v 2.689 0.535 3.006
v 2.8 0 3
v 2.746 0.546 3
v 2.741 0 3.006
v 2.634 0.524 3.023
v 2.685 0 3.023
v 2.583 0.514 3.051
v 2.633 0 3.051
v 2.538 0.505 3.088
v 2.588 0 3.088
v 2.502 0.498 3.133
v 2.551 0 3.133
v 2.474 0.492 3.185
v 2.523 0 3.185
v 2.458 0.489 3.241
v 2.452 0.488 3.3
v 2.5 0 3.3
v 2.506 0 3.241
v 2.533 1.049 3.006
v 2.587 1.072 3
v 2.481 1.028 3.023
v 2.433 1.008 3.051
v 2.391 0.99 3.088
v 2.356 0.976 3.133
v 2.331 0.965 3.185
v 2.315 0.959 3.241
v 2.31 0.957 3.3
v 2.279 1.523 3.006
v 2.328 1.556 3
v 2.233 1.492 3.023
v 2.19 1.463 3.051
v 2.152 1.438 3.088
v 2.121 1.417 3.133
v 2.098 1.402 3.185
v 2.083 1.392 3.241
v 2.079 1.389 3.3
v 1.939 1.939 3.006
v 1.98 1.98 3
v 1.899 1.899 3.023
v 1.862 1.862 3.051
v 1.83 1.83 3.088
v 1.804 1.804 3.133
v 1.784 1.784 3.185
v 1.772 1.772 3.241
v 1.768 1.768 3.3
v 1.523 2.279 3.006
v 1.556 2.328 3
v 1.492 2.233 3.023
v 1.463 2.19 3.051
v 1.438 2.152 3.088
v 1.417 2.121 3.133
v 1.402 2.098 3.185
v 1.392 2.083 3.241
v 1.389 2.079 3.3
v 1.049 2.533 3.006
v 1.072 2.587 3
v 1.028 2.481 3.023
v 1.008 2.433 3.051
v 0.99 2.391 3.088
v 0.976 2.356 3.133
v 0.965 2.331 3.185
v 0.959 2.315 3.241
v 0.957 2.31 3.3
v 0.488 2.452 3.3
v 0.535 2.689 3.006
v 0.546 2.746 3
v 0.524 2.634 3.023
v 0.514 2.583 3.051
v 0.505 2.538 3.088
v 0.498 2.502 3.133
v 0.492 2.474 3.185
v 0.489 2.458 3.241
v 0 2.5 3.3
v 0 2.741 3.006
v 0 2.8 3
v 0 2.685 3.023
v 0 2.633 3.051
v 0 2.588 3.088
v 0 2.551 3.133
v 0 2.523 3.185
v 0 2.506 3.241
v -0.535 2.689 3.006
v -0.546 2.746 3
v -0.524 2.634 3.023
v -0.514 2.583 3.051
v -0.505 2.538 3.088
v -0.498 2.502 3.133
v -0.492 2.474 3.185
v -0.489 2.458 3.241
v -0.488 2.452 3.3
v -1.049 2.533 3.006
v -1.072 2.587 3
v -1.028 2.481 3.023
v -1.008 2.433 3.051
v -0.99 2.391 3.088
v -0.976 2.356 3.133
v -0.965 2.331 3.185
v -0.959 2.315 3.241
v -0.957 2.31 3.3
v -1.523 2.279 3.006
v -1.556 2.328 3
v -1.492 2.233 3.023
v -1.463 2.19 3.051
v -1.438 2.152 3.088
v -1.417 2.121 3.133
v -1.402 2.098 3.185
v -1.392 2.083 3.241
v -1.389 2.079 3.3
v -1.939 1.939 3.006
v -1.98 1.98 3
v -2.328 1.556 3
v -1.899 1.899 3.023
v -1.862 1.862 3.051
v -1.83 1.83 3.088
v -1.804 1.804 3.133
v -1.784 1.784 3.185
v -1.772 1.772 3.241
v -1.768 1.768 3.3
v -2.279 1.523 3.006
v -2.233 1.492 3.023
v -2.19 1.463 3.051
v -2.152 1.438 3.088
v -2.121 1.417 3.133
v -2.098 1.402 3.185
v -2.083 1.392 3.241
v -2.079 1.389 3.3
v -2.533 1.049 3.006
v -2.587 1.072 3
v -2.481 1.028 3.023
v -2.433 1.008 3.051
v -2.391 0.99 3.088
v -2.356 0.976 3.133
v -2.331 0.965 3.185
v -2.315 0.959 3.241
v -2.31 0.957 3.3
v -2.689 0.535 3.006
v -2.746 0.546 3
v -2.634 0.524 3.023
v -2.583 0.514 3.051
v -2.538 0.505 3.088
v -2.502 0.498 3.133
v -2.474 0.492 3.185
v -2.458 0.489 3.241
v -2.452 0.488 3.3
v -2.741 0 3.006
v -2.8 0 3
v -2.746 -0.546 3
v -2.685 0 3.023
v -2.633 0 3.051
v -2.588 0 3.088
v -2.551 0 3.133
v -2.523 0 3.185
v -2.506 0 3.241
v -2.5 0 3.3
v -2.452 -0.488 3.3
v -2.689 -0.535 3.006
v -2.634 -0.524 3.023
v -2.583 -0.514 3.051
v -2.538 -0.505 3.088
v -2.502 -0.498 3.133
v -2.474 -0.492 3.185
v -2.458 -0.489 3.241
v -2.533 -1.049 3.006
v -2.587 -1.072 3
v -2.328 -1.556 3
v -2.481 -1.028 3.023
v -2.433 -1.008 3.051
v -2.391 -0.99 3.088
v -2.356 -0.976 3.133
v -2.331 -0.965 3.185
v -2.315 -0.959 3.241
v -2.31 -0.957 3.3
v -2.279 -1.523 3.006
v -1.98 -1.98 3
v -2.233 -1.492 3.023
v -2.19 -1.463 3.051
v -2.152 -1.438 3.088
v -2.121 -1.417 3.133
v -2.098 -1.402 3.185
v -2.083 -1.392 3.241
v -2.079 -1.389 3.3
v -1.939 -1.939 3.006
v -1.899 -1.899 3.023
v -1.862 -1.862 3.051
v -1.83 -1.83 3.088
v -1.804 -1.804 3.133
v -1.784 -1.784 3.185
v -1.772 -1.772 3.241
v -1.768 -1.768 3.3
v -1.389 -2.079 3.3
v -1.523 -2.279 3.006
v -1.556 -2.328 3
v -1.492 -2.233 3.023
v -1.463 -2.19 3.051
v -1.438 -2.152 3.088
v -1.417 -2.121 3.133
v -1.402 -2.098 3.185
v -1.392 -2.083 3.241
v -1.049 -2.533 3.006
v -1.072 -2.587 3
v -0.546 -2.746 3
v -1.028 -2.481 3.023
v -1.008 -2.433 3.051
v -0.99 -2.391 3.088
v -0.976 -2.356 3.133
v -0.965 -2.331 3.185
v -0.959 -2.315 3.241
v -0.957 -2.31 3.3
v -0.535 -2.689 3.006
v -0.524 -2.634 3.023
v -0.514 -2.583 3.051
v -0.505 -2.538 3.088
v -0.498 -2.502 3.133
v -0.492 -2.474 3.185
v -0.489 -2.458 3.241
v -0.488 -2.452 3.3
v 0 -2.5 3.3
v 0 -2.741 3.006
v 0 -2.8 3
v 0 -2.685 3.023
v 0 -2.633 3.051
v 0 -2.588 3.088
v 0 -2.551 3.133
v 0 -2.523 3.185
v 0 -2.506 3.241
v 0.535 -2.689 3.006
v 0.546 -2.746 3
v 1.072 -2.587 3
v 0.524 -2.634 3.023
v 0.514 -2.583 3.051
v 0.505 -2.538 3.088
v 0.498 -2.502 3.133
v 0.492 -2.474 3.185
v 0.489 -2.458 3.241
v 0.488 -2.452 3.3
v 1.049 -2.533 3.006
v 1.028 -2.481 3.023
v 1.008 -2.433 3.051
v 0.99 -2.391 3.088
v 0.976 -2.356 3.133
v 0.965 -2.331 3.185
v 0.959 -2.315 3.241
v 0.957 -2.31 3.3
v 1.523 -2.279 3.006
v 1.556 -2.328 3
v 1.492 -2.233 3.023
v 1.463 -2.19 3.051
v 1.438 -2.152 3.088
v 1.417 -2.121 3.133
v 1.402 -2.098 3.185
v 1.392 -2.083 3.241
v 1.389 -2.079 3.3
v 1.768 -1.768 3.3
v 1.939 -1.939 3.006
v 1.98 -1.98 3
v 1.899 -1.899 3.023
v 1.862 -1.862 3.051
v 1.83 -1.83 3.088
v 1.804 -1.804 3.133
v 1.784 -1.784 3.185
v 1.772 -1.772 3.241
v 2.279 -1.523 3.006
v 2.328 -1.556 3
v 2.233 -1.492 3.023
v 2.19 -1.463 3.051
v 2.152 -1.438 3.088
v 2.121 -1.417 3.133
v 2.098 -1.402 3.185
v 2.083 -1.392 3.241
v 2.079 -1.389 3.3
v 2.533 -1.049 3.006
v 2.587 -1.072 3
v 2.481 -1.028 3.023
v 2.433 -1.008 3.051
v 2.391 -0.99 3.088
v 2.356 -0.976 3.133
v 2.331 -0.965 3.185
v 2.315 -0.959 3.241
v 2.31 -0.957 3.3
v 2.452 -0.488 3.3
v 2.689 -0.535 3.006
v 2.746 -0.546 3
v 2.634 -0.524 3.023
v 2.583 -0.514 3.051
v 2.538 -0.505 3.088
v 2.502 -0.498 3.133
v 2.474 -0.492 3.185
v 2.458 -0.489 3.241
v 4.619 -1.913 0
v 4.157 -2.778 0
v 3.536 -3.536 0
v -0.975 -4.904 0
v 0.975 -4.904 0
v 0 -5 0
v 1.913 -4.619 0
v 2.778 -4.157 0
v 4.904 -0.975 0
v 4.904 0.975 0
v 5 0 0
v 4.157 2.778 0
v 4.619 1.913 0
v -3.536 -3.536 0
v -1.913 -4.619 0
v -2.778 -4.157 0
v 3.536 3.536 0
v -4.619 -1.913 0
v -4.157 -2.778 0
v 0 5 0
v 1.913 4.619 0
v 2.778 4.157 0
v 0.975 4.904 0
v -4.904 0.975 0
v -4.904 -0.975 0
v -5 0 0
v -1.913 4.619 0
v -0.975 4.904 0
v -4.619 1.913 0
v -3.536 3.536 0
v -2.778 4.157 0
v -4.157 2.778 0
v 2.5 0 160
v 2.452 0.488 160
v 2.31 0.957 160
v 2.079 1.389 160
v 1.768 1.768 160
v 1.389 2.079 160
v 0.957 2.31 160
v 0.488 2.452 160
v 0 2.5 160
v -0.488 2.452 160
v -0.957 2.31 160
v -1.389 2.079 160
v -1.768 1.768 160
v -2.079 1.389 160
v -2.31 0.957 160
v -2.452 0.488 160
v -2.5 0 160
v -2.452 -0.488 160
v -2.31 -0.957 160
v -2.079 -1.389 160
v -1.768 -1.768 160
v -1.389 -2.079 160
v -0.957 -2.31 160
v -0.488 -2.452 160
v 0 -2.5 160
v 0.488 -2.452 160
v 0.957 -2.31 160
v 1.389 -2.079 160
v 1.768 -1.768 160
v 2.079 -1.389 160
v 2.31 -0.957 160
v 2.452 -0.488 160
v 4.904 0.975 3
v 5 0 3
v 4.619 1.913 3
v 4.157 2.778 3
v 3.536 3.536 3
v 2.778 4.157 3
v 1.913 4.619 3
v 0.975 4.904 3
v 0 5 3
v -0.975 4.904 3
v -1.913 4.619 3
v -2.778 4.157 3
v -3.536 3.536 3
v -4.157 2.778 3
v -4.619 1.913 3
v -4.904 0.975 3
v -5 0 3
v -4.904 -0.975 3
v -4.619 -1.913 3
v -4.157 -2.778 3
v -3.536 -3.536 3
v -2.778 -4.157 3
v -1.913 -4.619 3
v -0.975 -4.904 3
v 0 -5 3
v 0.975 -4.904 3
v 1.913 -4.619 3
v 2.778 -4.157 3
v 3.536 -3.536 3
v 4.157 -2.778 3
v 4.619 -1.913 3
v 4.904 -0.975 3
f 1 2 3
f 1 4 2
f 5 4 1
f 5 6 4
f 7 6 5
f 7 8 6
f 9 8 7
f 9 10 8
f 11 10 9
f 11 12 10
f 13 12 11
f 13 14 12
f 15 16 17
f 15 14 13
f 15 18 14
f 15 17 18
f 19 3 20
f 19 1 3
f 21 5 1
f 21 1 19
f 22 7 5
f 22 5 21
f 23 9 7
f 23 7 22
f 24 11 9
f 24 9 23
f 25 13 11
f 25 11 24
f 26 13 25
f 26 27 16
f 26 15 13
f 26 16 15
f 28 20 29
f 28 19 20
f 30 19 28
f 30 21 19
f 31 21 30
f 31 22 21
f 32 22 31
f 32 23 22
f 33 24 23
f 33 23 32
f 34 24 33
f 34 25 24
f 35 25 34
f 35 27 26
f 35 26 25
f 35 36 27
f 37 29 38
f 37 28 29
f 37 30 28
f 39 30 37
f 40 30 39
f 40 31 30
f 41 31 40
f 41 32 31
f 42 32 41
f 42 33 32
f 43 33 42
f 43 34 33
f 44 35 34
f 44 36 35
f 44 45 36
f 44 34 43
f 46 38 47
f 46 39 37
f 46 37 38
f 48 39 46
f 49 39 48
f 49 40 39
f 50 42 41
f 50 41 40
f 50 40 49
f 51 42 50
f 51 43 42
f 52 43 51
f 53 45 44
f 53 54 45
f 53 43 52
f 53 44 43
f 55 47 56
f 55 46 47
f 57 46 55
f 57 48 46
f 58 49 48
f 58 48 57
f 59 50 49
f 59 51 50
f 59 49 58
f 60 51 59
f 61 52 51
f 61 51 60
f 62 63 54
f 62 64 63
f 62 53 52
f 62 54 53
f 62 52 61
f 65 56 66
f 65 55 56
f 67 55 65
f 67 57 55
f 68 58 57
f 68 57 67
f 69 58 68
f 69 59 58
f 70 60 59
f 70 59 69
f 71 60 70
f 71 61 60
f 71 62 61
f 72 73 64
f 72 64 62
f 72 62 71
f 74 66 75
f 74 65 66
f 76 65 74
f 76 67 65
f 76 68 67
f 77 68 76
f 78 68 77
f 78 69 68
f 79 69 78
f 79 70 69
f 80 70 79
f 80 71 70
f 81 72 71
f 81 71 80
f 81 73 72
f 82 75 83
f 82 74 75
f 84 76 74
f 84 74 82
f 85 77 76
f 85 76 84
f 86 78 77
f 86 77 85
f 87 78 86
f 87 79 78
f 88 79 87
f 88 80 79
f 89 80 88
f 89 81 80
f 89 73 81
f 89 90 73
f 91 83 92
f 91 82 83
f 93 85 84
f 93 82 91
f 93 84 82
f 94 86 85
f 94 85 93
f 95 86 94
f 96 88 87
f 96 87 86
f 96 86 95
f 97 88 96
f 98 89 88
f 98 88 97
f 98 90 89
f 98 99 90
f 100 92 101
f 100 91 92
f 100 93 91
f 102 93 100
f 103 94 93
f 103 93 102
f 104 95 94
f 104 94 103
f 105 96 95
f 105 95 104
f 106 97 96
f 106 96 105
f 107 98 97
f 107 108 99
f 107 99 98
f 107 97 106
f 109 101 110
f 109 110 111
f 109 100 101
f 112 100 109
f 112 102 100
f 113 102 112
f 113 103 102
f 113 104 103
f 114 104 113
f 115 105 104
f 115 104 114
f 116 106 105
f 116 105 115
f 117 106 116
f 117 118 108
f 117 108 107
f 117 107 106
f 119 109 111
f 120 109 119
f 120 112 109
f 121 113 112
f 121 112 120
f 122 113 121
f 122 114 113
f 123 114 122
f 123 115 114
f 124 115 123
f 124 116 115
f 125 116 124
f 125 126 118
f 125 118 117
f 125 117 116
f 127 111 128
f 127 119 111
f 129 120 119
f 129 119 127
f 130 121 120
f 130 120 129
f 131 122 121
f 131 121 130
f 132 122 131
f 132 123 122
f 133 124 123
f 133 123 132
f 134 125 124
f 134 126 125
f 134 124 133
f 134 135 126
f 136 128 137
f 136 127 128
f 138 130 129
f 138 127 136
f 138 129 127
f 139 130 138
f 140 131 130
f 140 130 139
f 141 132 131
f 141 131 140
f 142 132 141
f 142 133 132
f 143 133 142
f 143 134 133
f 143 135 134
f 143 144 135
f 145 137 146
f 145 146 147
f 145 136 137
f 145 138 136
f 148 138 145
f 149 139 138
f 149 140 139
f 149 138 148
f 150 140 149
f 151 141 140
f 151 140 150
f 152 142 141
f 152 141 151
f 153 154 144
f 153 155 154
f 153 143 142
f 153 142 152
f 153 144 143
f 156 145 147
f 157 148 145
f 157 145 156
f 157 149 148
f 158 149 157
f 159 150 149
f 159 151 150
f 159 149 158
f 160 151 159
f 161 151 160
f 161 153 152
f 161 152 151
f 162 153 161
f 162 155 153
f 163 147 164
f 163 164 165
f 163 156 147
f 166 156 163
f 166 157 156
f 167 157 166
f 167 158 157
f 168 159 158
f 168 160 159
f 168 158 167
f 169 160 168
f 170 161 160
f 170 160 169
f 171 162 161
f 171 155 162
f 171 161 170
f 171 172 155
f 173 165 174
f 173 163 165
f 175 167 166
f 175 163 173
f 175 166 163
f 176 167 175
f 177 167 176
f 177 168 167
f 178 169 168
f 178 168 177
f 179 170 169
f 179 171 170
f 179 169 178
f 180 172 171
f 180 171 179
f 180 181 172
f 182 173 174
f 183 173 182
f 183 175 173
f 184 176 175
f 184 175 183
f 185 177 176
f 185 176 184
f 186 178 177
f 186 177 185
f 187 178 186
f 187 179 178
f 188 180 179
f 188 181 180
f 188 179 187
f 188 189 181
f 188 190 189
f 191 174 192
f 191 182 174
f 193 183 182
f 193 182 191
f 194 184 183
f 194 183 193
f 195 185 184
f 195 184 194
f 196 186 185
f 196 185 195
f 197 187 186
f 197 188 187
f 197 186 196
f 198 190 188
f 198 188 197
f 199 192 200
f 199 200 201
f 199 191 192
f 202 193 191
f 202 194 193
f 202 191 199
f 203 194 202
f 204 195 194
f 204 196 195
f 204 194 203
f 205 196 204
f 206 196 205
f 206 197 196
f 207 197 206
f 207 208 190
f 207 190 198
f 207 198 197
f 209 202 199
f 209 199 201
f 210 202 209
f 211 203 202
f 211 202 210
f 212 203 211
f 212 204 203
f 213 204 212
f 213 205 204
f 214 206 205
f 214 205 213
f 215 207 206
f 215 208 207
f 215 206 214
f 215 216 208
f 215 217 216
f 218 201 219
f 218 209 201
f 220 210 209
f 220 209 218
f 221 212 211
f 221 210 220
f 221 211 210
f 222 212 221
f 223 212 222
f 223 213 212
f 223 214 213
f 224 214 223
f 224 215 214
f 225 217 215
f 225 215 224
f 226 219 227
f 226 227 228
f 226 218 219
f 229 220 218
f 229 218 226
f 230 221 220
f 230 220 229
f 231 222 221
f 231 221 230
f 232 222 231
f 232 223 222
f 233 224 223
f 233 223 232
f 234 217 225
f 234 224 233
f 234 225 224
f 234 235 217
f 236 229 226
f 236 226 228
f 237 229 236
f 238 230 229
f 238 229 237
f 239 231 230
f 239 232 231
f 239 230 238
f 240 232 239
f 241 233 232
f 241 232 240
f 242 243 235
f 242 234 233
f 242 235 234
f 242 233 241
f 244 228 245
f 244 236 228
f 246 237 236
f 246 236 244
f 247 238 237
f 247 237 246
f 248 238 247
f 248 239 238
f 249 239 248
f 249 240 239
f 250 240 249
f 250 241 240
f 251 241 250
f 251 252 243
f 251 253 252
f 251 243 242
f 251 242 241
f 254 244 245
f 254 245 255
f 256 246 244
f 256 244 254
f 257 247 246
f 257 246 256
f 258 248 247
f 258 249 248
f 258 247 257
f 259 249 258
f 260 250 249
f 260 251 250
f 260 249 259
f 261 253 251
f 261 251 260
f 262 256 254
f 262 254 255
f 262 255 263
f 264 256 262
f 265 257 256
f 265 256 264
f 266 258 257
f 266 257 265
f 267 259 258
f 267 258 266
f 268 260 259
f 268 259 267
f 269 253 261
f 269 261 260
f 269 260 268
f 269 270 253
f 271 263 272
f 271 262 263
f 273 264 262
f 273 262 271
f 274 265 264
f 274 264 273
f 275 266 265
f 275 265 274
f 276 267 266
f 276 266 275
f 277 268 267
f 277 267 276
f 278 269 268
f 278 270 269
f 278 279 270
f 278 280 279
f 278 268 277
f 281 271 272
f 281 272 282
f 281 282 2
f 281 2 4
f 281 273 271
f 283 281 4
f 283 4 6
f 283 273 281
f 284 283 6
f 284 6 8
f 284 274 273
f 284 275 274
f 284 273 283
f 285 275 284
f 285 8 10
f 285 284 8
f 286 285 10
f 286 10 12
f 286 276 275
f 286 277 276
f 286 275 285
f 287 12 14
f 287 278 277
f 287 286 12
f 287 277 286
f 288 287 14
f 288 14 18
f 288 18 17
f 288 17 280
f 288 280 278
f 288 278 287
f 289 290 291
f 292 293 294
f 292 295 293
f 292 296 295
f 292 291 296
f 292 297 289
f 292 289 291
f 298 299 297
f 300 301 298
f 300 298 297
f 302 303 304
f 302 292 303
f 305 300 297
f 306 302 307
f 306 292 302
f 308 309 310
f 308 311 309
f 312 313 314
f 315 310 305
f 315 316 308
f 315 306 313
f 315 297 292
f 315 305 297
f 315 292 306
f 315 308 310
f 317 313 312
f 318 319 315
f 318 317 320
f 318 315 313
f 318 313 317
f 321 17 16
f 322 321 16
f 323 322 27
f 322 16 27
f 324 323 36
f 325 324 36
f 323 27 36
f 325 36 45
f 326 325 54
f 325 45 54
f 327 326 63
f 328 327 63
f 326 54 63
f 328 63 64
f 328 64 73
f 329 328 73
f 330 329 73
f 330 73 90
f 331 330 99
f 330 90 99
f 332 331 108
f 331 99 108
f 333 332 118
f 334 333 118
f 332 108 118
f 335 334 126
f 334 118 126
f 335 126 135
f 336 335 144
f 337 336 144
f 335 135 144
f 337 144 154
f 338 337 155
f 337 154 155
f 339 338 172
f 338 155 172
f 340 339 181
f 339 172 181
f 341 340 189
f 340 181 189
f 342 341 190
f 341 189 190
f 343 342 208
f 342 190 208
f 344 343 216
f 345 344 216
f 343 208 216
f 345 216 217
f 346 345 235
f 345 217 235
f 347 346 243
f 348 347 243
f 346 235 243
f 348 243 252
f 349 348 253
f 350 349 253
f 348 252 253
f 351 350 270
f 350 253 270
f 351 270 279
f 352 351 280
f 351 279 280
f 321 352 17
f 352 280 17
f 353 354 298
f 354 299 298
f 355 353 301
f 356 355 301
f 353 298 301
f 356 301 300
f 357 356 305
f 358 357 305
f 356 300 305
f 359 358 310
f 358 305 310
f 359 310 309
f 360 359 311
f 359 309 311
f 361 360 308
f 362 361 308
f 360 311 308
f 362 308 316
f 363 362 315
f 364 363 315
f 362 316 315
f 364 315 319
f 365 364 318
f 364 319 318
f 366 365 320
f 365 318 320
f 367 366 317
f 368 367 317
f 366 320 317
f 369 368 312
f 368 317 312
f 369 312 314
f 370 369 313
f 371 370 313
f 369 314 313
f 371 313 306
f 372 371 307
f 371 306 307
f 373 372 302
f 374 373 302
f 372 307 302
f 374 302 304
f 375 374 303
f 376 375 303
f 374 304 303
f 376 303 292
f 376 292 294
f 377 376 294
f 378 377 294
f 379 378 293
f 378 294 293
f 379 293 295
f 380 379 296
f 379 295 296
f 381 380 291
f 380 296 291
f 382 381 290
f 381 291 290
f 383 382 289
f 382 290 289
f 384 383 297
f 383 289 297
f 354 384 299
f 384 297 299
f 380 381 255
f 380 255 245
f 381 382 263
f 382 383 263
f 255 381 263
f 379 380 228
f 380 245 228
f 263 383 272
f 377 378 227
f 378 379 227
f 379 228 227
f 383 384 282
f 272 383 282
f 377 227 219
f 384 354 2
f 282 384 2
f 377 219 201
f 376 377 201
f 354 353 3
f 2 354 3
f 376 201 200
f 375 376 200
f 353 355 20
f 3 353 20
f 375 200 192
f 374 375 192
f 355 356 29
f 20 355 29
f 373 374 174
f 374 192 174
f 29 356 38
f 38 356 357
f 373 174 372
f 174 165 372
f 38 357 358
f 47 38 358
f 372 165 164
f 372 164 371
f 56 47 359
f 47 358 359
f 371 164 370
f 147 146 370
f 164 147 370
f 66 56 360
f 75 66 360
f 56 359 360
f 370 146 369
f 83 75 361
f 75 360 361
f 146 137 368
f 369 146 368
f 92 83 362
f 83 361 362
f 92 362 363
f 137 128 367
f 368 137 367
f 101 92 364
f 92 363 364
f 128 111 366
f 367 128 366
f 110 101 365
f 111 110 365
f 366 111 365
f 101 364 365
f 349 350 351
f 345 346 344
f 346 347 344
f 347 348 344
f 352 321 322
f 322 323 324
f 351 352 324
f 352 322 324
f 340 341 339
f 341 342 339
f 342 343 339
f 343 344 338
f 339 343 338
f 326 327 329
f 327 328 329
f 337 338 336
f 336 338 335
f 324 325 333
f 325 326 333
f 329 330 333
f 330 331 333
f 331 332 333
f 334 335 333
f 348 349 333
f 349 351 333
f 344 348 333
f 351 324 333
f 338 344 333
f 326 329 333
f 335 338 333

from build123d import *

# Parameters (mm, degrees)
SZKIC1_W = 3
SZKIC1_H = 5
SZKIC2_W = 157
SZKIC2_H = 2.5


with BuildPart() as part:
    # Szkic1 → Obrót1 (revolve)
    with BuildSketch(Plane(origin=(0, 0, 0), x_dir=(0, 0, -1), z_dir=(1, 0, 0))):
        with Locations((-1.5, 2.5)):
            Rectangle(SZKIC1_W, SZKIC1_H)
    revolve(axis=Axis((0, 0, 0), (0, 0, 1)))

    # Szkic2 → Obrót2 (revolve)
    with BuildSketch(Plane(origin=(0, 0, 0), x_dir=(0, 0, -1), z_dir=(1, 0, 0))):
        with Locations((-81.5, 1.25)):
            Rectangle(SZKIC2_W, SZKIC2_H)
    revolve(axis=Axis((0, 0, 3), (0, 0, 1)))

    # Szkic3 → Obrót3 (revolve)
    with BuildSketch(Plane(origin=(0, 0, 0), x_dir=(0, 0, -1), z_dir=(1, 0, 0))):
        with BuildLine():
            Line((-3.3, 2.5), (-3, 2.5))
            Line((-3, 2.5), (-3, 2.8))
            ThreePointArc((-3, 2.8), (-3.087867966, 2.587867966), (-3.3, 2.5))
        make_face()
    revolve(axis=Axis((0, 0, 0), (0, 0, 1)))


solid = part.part
